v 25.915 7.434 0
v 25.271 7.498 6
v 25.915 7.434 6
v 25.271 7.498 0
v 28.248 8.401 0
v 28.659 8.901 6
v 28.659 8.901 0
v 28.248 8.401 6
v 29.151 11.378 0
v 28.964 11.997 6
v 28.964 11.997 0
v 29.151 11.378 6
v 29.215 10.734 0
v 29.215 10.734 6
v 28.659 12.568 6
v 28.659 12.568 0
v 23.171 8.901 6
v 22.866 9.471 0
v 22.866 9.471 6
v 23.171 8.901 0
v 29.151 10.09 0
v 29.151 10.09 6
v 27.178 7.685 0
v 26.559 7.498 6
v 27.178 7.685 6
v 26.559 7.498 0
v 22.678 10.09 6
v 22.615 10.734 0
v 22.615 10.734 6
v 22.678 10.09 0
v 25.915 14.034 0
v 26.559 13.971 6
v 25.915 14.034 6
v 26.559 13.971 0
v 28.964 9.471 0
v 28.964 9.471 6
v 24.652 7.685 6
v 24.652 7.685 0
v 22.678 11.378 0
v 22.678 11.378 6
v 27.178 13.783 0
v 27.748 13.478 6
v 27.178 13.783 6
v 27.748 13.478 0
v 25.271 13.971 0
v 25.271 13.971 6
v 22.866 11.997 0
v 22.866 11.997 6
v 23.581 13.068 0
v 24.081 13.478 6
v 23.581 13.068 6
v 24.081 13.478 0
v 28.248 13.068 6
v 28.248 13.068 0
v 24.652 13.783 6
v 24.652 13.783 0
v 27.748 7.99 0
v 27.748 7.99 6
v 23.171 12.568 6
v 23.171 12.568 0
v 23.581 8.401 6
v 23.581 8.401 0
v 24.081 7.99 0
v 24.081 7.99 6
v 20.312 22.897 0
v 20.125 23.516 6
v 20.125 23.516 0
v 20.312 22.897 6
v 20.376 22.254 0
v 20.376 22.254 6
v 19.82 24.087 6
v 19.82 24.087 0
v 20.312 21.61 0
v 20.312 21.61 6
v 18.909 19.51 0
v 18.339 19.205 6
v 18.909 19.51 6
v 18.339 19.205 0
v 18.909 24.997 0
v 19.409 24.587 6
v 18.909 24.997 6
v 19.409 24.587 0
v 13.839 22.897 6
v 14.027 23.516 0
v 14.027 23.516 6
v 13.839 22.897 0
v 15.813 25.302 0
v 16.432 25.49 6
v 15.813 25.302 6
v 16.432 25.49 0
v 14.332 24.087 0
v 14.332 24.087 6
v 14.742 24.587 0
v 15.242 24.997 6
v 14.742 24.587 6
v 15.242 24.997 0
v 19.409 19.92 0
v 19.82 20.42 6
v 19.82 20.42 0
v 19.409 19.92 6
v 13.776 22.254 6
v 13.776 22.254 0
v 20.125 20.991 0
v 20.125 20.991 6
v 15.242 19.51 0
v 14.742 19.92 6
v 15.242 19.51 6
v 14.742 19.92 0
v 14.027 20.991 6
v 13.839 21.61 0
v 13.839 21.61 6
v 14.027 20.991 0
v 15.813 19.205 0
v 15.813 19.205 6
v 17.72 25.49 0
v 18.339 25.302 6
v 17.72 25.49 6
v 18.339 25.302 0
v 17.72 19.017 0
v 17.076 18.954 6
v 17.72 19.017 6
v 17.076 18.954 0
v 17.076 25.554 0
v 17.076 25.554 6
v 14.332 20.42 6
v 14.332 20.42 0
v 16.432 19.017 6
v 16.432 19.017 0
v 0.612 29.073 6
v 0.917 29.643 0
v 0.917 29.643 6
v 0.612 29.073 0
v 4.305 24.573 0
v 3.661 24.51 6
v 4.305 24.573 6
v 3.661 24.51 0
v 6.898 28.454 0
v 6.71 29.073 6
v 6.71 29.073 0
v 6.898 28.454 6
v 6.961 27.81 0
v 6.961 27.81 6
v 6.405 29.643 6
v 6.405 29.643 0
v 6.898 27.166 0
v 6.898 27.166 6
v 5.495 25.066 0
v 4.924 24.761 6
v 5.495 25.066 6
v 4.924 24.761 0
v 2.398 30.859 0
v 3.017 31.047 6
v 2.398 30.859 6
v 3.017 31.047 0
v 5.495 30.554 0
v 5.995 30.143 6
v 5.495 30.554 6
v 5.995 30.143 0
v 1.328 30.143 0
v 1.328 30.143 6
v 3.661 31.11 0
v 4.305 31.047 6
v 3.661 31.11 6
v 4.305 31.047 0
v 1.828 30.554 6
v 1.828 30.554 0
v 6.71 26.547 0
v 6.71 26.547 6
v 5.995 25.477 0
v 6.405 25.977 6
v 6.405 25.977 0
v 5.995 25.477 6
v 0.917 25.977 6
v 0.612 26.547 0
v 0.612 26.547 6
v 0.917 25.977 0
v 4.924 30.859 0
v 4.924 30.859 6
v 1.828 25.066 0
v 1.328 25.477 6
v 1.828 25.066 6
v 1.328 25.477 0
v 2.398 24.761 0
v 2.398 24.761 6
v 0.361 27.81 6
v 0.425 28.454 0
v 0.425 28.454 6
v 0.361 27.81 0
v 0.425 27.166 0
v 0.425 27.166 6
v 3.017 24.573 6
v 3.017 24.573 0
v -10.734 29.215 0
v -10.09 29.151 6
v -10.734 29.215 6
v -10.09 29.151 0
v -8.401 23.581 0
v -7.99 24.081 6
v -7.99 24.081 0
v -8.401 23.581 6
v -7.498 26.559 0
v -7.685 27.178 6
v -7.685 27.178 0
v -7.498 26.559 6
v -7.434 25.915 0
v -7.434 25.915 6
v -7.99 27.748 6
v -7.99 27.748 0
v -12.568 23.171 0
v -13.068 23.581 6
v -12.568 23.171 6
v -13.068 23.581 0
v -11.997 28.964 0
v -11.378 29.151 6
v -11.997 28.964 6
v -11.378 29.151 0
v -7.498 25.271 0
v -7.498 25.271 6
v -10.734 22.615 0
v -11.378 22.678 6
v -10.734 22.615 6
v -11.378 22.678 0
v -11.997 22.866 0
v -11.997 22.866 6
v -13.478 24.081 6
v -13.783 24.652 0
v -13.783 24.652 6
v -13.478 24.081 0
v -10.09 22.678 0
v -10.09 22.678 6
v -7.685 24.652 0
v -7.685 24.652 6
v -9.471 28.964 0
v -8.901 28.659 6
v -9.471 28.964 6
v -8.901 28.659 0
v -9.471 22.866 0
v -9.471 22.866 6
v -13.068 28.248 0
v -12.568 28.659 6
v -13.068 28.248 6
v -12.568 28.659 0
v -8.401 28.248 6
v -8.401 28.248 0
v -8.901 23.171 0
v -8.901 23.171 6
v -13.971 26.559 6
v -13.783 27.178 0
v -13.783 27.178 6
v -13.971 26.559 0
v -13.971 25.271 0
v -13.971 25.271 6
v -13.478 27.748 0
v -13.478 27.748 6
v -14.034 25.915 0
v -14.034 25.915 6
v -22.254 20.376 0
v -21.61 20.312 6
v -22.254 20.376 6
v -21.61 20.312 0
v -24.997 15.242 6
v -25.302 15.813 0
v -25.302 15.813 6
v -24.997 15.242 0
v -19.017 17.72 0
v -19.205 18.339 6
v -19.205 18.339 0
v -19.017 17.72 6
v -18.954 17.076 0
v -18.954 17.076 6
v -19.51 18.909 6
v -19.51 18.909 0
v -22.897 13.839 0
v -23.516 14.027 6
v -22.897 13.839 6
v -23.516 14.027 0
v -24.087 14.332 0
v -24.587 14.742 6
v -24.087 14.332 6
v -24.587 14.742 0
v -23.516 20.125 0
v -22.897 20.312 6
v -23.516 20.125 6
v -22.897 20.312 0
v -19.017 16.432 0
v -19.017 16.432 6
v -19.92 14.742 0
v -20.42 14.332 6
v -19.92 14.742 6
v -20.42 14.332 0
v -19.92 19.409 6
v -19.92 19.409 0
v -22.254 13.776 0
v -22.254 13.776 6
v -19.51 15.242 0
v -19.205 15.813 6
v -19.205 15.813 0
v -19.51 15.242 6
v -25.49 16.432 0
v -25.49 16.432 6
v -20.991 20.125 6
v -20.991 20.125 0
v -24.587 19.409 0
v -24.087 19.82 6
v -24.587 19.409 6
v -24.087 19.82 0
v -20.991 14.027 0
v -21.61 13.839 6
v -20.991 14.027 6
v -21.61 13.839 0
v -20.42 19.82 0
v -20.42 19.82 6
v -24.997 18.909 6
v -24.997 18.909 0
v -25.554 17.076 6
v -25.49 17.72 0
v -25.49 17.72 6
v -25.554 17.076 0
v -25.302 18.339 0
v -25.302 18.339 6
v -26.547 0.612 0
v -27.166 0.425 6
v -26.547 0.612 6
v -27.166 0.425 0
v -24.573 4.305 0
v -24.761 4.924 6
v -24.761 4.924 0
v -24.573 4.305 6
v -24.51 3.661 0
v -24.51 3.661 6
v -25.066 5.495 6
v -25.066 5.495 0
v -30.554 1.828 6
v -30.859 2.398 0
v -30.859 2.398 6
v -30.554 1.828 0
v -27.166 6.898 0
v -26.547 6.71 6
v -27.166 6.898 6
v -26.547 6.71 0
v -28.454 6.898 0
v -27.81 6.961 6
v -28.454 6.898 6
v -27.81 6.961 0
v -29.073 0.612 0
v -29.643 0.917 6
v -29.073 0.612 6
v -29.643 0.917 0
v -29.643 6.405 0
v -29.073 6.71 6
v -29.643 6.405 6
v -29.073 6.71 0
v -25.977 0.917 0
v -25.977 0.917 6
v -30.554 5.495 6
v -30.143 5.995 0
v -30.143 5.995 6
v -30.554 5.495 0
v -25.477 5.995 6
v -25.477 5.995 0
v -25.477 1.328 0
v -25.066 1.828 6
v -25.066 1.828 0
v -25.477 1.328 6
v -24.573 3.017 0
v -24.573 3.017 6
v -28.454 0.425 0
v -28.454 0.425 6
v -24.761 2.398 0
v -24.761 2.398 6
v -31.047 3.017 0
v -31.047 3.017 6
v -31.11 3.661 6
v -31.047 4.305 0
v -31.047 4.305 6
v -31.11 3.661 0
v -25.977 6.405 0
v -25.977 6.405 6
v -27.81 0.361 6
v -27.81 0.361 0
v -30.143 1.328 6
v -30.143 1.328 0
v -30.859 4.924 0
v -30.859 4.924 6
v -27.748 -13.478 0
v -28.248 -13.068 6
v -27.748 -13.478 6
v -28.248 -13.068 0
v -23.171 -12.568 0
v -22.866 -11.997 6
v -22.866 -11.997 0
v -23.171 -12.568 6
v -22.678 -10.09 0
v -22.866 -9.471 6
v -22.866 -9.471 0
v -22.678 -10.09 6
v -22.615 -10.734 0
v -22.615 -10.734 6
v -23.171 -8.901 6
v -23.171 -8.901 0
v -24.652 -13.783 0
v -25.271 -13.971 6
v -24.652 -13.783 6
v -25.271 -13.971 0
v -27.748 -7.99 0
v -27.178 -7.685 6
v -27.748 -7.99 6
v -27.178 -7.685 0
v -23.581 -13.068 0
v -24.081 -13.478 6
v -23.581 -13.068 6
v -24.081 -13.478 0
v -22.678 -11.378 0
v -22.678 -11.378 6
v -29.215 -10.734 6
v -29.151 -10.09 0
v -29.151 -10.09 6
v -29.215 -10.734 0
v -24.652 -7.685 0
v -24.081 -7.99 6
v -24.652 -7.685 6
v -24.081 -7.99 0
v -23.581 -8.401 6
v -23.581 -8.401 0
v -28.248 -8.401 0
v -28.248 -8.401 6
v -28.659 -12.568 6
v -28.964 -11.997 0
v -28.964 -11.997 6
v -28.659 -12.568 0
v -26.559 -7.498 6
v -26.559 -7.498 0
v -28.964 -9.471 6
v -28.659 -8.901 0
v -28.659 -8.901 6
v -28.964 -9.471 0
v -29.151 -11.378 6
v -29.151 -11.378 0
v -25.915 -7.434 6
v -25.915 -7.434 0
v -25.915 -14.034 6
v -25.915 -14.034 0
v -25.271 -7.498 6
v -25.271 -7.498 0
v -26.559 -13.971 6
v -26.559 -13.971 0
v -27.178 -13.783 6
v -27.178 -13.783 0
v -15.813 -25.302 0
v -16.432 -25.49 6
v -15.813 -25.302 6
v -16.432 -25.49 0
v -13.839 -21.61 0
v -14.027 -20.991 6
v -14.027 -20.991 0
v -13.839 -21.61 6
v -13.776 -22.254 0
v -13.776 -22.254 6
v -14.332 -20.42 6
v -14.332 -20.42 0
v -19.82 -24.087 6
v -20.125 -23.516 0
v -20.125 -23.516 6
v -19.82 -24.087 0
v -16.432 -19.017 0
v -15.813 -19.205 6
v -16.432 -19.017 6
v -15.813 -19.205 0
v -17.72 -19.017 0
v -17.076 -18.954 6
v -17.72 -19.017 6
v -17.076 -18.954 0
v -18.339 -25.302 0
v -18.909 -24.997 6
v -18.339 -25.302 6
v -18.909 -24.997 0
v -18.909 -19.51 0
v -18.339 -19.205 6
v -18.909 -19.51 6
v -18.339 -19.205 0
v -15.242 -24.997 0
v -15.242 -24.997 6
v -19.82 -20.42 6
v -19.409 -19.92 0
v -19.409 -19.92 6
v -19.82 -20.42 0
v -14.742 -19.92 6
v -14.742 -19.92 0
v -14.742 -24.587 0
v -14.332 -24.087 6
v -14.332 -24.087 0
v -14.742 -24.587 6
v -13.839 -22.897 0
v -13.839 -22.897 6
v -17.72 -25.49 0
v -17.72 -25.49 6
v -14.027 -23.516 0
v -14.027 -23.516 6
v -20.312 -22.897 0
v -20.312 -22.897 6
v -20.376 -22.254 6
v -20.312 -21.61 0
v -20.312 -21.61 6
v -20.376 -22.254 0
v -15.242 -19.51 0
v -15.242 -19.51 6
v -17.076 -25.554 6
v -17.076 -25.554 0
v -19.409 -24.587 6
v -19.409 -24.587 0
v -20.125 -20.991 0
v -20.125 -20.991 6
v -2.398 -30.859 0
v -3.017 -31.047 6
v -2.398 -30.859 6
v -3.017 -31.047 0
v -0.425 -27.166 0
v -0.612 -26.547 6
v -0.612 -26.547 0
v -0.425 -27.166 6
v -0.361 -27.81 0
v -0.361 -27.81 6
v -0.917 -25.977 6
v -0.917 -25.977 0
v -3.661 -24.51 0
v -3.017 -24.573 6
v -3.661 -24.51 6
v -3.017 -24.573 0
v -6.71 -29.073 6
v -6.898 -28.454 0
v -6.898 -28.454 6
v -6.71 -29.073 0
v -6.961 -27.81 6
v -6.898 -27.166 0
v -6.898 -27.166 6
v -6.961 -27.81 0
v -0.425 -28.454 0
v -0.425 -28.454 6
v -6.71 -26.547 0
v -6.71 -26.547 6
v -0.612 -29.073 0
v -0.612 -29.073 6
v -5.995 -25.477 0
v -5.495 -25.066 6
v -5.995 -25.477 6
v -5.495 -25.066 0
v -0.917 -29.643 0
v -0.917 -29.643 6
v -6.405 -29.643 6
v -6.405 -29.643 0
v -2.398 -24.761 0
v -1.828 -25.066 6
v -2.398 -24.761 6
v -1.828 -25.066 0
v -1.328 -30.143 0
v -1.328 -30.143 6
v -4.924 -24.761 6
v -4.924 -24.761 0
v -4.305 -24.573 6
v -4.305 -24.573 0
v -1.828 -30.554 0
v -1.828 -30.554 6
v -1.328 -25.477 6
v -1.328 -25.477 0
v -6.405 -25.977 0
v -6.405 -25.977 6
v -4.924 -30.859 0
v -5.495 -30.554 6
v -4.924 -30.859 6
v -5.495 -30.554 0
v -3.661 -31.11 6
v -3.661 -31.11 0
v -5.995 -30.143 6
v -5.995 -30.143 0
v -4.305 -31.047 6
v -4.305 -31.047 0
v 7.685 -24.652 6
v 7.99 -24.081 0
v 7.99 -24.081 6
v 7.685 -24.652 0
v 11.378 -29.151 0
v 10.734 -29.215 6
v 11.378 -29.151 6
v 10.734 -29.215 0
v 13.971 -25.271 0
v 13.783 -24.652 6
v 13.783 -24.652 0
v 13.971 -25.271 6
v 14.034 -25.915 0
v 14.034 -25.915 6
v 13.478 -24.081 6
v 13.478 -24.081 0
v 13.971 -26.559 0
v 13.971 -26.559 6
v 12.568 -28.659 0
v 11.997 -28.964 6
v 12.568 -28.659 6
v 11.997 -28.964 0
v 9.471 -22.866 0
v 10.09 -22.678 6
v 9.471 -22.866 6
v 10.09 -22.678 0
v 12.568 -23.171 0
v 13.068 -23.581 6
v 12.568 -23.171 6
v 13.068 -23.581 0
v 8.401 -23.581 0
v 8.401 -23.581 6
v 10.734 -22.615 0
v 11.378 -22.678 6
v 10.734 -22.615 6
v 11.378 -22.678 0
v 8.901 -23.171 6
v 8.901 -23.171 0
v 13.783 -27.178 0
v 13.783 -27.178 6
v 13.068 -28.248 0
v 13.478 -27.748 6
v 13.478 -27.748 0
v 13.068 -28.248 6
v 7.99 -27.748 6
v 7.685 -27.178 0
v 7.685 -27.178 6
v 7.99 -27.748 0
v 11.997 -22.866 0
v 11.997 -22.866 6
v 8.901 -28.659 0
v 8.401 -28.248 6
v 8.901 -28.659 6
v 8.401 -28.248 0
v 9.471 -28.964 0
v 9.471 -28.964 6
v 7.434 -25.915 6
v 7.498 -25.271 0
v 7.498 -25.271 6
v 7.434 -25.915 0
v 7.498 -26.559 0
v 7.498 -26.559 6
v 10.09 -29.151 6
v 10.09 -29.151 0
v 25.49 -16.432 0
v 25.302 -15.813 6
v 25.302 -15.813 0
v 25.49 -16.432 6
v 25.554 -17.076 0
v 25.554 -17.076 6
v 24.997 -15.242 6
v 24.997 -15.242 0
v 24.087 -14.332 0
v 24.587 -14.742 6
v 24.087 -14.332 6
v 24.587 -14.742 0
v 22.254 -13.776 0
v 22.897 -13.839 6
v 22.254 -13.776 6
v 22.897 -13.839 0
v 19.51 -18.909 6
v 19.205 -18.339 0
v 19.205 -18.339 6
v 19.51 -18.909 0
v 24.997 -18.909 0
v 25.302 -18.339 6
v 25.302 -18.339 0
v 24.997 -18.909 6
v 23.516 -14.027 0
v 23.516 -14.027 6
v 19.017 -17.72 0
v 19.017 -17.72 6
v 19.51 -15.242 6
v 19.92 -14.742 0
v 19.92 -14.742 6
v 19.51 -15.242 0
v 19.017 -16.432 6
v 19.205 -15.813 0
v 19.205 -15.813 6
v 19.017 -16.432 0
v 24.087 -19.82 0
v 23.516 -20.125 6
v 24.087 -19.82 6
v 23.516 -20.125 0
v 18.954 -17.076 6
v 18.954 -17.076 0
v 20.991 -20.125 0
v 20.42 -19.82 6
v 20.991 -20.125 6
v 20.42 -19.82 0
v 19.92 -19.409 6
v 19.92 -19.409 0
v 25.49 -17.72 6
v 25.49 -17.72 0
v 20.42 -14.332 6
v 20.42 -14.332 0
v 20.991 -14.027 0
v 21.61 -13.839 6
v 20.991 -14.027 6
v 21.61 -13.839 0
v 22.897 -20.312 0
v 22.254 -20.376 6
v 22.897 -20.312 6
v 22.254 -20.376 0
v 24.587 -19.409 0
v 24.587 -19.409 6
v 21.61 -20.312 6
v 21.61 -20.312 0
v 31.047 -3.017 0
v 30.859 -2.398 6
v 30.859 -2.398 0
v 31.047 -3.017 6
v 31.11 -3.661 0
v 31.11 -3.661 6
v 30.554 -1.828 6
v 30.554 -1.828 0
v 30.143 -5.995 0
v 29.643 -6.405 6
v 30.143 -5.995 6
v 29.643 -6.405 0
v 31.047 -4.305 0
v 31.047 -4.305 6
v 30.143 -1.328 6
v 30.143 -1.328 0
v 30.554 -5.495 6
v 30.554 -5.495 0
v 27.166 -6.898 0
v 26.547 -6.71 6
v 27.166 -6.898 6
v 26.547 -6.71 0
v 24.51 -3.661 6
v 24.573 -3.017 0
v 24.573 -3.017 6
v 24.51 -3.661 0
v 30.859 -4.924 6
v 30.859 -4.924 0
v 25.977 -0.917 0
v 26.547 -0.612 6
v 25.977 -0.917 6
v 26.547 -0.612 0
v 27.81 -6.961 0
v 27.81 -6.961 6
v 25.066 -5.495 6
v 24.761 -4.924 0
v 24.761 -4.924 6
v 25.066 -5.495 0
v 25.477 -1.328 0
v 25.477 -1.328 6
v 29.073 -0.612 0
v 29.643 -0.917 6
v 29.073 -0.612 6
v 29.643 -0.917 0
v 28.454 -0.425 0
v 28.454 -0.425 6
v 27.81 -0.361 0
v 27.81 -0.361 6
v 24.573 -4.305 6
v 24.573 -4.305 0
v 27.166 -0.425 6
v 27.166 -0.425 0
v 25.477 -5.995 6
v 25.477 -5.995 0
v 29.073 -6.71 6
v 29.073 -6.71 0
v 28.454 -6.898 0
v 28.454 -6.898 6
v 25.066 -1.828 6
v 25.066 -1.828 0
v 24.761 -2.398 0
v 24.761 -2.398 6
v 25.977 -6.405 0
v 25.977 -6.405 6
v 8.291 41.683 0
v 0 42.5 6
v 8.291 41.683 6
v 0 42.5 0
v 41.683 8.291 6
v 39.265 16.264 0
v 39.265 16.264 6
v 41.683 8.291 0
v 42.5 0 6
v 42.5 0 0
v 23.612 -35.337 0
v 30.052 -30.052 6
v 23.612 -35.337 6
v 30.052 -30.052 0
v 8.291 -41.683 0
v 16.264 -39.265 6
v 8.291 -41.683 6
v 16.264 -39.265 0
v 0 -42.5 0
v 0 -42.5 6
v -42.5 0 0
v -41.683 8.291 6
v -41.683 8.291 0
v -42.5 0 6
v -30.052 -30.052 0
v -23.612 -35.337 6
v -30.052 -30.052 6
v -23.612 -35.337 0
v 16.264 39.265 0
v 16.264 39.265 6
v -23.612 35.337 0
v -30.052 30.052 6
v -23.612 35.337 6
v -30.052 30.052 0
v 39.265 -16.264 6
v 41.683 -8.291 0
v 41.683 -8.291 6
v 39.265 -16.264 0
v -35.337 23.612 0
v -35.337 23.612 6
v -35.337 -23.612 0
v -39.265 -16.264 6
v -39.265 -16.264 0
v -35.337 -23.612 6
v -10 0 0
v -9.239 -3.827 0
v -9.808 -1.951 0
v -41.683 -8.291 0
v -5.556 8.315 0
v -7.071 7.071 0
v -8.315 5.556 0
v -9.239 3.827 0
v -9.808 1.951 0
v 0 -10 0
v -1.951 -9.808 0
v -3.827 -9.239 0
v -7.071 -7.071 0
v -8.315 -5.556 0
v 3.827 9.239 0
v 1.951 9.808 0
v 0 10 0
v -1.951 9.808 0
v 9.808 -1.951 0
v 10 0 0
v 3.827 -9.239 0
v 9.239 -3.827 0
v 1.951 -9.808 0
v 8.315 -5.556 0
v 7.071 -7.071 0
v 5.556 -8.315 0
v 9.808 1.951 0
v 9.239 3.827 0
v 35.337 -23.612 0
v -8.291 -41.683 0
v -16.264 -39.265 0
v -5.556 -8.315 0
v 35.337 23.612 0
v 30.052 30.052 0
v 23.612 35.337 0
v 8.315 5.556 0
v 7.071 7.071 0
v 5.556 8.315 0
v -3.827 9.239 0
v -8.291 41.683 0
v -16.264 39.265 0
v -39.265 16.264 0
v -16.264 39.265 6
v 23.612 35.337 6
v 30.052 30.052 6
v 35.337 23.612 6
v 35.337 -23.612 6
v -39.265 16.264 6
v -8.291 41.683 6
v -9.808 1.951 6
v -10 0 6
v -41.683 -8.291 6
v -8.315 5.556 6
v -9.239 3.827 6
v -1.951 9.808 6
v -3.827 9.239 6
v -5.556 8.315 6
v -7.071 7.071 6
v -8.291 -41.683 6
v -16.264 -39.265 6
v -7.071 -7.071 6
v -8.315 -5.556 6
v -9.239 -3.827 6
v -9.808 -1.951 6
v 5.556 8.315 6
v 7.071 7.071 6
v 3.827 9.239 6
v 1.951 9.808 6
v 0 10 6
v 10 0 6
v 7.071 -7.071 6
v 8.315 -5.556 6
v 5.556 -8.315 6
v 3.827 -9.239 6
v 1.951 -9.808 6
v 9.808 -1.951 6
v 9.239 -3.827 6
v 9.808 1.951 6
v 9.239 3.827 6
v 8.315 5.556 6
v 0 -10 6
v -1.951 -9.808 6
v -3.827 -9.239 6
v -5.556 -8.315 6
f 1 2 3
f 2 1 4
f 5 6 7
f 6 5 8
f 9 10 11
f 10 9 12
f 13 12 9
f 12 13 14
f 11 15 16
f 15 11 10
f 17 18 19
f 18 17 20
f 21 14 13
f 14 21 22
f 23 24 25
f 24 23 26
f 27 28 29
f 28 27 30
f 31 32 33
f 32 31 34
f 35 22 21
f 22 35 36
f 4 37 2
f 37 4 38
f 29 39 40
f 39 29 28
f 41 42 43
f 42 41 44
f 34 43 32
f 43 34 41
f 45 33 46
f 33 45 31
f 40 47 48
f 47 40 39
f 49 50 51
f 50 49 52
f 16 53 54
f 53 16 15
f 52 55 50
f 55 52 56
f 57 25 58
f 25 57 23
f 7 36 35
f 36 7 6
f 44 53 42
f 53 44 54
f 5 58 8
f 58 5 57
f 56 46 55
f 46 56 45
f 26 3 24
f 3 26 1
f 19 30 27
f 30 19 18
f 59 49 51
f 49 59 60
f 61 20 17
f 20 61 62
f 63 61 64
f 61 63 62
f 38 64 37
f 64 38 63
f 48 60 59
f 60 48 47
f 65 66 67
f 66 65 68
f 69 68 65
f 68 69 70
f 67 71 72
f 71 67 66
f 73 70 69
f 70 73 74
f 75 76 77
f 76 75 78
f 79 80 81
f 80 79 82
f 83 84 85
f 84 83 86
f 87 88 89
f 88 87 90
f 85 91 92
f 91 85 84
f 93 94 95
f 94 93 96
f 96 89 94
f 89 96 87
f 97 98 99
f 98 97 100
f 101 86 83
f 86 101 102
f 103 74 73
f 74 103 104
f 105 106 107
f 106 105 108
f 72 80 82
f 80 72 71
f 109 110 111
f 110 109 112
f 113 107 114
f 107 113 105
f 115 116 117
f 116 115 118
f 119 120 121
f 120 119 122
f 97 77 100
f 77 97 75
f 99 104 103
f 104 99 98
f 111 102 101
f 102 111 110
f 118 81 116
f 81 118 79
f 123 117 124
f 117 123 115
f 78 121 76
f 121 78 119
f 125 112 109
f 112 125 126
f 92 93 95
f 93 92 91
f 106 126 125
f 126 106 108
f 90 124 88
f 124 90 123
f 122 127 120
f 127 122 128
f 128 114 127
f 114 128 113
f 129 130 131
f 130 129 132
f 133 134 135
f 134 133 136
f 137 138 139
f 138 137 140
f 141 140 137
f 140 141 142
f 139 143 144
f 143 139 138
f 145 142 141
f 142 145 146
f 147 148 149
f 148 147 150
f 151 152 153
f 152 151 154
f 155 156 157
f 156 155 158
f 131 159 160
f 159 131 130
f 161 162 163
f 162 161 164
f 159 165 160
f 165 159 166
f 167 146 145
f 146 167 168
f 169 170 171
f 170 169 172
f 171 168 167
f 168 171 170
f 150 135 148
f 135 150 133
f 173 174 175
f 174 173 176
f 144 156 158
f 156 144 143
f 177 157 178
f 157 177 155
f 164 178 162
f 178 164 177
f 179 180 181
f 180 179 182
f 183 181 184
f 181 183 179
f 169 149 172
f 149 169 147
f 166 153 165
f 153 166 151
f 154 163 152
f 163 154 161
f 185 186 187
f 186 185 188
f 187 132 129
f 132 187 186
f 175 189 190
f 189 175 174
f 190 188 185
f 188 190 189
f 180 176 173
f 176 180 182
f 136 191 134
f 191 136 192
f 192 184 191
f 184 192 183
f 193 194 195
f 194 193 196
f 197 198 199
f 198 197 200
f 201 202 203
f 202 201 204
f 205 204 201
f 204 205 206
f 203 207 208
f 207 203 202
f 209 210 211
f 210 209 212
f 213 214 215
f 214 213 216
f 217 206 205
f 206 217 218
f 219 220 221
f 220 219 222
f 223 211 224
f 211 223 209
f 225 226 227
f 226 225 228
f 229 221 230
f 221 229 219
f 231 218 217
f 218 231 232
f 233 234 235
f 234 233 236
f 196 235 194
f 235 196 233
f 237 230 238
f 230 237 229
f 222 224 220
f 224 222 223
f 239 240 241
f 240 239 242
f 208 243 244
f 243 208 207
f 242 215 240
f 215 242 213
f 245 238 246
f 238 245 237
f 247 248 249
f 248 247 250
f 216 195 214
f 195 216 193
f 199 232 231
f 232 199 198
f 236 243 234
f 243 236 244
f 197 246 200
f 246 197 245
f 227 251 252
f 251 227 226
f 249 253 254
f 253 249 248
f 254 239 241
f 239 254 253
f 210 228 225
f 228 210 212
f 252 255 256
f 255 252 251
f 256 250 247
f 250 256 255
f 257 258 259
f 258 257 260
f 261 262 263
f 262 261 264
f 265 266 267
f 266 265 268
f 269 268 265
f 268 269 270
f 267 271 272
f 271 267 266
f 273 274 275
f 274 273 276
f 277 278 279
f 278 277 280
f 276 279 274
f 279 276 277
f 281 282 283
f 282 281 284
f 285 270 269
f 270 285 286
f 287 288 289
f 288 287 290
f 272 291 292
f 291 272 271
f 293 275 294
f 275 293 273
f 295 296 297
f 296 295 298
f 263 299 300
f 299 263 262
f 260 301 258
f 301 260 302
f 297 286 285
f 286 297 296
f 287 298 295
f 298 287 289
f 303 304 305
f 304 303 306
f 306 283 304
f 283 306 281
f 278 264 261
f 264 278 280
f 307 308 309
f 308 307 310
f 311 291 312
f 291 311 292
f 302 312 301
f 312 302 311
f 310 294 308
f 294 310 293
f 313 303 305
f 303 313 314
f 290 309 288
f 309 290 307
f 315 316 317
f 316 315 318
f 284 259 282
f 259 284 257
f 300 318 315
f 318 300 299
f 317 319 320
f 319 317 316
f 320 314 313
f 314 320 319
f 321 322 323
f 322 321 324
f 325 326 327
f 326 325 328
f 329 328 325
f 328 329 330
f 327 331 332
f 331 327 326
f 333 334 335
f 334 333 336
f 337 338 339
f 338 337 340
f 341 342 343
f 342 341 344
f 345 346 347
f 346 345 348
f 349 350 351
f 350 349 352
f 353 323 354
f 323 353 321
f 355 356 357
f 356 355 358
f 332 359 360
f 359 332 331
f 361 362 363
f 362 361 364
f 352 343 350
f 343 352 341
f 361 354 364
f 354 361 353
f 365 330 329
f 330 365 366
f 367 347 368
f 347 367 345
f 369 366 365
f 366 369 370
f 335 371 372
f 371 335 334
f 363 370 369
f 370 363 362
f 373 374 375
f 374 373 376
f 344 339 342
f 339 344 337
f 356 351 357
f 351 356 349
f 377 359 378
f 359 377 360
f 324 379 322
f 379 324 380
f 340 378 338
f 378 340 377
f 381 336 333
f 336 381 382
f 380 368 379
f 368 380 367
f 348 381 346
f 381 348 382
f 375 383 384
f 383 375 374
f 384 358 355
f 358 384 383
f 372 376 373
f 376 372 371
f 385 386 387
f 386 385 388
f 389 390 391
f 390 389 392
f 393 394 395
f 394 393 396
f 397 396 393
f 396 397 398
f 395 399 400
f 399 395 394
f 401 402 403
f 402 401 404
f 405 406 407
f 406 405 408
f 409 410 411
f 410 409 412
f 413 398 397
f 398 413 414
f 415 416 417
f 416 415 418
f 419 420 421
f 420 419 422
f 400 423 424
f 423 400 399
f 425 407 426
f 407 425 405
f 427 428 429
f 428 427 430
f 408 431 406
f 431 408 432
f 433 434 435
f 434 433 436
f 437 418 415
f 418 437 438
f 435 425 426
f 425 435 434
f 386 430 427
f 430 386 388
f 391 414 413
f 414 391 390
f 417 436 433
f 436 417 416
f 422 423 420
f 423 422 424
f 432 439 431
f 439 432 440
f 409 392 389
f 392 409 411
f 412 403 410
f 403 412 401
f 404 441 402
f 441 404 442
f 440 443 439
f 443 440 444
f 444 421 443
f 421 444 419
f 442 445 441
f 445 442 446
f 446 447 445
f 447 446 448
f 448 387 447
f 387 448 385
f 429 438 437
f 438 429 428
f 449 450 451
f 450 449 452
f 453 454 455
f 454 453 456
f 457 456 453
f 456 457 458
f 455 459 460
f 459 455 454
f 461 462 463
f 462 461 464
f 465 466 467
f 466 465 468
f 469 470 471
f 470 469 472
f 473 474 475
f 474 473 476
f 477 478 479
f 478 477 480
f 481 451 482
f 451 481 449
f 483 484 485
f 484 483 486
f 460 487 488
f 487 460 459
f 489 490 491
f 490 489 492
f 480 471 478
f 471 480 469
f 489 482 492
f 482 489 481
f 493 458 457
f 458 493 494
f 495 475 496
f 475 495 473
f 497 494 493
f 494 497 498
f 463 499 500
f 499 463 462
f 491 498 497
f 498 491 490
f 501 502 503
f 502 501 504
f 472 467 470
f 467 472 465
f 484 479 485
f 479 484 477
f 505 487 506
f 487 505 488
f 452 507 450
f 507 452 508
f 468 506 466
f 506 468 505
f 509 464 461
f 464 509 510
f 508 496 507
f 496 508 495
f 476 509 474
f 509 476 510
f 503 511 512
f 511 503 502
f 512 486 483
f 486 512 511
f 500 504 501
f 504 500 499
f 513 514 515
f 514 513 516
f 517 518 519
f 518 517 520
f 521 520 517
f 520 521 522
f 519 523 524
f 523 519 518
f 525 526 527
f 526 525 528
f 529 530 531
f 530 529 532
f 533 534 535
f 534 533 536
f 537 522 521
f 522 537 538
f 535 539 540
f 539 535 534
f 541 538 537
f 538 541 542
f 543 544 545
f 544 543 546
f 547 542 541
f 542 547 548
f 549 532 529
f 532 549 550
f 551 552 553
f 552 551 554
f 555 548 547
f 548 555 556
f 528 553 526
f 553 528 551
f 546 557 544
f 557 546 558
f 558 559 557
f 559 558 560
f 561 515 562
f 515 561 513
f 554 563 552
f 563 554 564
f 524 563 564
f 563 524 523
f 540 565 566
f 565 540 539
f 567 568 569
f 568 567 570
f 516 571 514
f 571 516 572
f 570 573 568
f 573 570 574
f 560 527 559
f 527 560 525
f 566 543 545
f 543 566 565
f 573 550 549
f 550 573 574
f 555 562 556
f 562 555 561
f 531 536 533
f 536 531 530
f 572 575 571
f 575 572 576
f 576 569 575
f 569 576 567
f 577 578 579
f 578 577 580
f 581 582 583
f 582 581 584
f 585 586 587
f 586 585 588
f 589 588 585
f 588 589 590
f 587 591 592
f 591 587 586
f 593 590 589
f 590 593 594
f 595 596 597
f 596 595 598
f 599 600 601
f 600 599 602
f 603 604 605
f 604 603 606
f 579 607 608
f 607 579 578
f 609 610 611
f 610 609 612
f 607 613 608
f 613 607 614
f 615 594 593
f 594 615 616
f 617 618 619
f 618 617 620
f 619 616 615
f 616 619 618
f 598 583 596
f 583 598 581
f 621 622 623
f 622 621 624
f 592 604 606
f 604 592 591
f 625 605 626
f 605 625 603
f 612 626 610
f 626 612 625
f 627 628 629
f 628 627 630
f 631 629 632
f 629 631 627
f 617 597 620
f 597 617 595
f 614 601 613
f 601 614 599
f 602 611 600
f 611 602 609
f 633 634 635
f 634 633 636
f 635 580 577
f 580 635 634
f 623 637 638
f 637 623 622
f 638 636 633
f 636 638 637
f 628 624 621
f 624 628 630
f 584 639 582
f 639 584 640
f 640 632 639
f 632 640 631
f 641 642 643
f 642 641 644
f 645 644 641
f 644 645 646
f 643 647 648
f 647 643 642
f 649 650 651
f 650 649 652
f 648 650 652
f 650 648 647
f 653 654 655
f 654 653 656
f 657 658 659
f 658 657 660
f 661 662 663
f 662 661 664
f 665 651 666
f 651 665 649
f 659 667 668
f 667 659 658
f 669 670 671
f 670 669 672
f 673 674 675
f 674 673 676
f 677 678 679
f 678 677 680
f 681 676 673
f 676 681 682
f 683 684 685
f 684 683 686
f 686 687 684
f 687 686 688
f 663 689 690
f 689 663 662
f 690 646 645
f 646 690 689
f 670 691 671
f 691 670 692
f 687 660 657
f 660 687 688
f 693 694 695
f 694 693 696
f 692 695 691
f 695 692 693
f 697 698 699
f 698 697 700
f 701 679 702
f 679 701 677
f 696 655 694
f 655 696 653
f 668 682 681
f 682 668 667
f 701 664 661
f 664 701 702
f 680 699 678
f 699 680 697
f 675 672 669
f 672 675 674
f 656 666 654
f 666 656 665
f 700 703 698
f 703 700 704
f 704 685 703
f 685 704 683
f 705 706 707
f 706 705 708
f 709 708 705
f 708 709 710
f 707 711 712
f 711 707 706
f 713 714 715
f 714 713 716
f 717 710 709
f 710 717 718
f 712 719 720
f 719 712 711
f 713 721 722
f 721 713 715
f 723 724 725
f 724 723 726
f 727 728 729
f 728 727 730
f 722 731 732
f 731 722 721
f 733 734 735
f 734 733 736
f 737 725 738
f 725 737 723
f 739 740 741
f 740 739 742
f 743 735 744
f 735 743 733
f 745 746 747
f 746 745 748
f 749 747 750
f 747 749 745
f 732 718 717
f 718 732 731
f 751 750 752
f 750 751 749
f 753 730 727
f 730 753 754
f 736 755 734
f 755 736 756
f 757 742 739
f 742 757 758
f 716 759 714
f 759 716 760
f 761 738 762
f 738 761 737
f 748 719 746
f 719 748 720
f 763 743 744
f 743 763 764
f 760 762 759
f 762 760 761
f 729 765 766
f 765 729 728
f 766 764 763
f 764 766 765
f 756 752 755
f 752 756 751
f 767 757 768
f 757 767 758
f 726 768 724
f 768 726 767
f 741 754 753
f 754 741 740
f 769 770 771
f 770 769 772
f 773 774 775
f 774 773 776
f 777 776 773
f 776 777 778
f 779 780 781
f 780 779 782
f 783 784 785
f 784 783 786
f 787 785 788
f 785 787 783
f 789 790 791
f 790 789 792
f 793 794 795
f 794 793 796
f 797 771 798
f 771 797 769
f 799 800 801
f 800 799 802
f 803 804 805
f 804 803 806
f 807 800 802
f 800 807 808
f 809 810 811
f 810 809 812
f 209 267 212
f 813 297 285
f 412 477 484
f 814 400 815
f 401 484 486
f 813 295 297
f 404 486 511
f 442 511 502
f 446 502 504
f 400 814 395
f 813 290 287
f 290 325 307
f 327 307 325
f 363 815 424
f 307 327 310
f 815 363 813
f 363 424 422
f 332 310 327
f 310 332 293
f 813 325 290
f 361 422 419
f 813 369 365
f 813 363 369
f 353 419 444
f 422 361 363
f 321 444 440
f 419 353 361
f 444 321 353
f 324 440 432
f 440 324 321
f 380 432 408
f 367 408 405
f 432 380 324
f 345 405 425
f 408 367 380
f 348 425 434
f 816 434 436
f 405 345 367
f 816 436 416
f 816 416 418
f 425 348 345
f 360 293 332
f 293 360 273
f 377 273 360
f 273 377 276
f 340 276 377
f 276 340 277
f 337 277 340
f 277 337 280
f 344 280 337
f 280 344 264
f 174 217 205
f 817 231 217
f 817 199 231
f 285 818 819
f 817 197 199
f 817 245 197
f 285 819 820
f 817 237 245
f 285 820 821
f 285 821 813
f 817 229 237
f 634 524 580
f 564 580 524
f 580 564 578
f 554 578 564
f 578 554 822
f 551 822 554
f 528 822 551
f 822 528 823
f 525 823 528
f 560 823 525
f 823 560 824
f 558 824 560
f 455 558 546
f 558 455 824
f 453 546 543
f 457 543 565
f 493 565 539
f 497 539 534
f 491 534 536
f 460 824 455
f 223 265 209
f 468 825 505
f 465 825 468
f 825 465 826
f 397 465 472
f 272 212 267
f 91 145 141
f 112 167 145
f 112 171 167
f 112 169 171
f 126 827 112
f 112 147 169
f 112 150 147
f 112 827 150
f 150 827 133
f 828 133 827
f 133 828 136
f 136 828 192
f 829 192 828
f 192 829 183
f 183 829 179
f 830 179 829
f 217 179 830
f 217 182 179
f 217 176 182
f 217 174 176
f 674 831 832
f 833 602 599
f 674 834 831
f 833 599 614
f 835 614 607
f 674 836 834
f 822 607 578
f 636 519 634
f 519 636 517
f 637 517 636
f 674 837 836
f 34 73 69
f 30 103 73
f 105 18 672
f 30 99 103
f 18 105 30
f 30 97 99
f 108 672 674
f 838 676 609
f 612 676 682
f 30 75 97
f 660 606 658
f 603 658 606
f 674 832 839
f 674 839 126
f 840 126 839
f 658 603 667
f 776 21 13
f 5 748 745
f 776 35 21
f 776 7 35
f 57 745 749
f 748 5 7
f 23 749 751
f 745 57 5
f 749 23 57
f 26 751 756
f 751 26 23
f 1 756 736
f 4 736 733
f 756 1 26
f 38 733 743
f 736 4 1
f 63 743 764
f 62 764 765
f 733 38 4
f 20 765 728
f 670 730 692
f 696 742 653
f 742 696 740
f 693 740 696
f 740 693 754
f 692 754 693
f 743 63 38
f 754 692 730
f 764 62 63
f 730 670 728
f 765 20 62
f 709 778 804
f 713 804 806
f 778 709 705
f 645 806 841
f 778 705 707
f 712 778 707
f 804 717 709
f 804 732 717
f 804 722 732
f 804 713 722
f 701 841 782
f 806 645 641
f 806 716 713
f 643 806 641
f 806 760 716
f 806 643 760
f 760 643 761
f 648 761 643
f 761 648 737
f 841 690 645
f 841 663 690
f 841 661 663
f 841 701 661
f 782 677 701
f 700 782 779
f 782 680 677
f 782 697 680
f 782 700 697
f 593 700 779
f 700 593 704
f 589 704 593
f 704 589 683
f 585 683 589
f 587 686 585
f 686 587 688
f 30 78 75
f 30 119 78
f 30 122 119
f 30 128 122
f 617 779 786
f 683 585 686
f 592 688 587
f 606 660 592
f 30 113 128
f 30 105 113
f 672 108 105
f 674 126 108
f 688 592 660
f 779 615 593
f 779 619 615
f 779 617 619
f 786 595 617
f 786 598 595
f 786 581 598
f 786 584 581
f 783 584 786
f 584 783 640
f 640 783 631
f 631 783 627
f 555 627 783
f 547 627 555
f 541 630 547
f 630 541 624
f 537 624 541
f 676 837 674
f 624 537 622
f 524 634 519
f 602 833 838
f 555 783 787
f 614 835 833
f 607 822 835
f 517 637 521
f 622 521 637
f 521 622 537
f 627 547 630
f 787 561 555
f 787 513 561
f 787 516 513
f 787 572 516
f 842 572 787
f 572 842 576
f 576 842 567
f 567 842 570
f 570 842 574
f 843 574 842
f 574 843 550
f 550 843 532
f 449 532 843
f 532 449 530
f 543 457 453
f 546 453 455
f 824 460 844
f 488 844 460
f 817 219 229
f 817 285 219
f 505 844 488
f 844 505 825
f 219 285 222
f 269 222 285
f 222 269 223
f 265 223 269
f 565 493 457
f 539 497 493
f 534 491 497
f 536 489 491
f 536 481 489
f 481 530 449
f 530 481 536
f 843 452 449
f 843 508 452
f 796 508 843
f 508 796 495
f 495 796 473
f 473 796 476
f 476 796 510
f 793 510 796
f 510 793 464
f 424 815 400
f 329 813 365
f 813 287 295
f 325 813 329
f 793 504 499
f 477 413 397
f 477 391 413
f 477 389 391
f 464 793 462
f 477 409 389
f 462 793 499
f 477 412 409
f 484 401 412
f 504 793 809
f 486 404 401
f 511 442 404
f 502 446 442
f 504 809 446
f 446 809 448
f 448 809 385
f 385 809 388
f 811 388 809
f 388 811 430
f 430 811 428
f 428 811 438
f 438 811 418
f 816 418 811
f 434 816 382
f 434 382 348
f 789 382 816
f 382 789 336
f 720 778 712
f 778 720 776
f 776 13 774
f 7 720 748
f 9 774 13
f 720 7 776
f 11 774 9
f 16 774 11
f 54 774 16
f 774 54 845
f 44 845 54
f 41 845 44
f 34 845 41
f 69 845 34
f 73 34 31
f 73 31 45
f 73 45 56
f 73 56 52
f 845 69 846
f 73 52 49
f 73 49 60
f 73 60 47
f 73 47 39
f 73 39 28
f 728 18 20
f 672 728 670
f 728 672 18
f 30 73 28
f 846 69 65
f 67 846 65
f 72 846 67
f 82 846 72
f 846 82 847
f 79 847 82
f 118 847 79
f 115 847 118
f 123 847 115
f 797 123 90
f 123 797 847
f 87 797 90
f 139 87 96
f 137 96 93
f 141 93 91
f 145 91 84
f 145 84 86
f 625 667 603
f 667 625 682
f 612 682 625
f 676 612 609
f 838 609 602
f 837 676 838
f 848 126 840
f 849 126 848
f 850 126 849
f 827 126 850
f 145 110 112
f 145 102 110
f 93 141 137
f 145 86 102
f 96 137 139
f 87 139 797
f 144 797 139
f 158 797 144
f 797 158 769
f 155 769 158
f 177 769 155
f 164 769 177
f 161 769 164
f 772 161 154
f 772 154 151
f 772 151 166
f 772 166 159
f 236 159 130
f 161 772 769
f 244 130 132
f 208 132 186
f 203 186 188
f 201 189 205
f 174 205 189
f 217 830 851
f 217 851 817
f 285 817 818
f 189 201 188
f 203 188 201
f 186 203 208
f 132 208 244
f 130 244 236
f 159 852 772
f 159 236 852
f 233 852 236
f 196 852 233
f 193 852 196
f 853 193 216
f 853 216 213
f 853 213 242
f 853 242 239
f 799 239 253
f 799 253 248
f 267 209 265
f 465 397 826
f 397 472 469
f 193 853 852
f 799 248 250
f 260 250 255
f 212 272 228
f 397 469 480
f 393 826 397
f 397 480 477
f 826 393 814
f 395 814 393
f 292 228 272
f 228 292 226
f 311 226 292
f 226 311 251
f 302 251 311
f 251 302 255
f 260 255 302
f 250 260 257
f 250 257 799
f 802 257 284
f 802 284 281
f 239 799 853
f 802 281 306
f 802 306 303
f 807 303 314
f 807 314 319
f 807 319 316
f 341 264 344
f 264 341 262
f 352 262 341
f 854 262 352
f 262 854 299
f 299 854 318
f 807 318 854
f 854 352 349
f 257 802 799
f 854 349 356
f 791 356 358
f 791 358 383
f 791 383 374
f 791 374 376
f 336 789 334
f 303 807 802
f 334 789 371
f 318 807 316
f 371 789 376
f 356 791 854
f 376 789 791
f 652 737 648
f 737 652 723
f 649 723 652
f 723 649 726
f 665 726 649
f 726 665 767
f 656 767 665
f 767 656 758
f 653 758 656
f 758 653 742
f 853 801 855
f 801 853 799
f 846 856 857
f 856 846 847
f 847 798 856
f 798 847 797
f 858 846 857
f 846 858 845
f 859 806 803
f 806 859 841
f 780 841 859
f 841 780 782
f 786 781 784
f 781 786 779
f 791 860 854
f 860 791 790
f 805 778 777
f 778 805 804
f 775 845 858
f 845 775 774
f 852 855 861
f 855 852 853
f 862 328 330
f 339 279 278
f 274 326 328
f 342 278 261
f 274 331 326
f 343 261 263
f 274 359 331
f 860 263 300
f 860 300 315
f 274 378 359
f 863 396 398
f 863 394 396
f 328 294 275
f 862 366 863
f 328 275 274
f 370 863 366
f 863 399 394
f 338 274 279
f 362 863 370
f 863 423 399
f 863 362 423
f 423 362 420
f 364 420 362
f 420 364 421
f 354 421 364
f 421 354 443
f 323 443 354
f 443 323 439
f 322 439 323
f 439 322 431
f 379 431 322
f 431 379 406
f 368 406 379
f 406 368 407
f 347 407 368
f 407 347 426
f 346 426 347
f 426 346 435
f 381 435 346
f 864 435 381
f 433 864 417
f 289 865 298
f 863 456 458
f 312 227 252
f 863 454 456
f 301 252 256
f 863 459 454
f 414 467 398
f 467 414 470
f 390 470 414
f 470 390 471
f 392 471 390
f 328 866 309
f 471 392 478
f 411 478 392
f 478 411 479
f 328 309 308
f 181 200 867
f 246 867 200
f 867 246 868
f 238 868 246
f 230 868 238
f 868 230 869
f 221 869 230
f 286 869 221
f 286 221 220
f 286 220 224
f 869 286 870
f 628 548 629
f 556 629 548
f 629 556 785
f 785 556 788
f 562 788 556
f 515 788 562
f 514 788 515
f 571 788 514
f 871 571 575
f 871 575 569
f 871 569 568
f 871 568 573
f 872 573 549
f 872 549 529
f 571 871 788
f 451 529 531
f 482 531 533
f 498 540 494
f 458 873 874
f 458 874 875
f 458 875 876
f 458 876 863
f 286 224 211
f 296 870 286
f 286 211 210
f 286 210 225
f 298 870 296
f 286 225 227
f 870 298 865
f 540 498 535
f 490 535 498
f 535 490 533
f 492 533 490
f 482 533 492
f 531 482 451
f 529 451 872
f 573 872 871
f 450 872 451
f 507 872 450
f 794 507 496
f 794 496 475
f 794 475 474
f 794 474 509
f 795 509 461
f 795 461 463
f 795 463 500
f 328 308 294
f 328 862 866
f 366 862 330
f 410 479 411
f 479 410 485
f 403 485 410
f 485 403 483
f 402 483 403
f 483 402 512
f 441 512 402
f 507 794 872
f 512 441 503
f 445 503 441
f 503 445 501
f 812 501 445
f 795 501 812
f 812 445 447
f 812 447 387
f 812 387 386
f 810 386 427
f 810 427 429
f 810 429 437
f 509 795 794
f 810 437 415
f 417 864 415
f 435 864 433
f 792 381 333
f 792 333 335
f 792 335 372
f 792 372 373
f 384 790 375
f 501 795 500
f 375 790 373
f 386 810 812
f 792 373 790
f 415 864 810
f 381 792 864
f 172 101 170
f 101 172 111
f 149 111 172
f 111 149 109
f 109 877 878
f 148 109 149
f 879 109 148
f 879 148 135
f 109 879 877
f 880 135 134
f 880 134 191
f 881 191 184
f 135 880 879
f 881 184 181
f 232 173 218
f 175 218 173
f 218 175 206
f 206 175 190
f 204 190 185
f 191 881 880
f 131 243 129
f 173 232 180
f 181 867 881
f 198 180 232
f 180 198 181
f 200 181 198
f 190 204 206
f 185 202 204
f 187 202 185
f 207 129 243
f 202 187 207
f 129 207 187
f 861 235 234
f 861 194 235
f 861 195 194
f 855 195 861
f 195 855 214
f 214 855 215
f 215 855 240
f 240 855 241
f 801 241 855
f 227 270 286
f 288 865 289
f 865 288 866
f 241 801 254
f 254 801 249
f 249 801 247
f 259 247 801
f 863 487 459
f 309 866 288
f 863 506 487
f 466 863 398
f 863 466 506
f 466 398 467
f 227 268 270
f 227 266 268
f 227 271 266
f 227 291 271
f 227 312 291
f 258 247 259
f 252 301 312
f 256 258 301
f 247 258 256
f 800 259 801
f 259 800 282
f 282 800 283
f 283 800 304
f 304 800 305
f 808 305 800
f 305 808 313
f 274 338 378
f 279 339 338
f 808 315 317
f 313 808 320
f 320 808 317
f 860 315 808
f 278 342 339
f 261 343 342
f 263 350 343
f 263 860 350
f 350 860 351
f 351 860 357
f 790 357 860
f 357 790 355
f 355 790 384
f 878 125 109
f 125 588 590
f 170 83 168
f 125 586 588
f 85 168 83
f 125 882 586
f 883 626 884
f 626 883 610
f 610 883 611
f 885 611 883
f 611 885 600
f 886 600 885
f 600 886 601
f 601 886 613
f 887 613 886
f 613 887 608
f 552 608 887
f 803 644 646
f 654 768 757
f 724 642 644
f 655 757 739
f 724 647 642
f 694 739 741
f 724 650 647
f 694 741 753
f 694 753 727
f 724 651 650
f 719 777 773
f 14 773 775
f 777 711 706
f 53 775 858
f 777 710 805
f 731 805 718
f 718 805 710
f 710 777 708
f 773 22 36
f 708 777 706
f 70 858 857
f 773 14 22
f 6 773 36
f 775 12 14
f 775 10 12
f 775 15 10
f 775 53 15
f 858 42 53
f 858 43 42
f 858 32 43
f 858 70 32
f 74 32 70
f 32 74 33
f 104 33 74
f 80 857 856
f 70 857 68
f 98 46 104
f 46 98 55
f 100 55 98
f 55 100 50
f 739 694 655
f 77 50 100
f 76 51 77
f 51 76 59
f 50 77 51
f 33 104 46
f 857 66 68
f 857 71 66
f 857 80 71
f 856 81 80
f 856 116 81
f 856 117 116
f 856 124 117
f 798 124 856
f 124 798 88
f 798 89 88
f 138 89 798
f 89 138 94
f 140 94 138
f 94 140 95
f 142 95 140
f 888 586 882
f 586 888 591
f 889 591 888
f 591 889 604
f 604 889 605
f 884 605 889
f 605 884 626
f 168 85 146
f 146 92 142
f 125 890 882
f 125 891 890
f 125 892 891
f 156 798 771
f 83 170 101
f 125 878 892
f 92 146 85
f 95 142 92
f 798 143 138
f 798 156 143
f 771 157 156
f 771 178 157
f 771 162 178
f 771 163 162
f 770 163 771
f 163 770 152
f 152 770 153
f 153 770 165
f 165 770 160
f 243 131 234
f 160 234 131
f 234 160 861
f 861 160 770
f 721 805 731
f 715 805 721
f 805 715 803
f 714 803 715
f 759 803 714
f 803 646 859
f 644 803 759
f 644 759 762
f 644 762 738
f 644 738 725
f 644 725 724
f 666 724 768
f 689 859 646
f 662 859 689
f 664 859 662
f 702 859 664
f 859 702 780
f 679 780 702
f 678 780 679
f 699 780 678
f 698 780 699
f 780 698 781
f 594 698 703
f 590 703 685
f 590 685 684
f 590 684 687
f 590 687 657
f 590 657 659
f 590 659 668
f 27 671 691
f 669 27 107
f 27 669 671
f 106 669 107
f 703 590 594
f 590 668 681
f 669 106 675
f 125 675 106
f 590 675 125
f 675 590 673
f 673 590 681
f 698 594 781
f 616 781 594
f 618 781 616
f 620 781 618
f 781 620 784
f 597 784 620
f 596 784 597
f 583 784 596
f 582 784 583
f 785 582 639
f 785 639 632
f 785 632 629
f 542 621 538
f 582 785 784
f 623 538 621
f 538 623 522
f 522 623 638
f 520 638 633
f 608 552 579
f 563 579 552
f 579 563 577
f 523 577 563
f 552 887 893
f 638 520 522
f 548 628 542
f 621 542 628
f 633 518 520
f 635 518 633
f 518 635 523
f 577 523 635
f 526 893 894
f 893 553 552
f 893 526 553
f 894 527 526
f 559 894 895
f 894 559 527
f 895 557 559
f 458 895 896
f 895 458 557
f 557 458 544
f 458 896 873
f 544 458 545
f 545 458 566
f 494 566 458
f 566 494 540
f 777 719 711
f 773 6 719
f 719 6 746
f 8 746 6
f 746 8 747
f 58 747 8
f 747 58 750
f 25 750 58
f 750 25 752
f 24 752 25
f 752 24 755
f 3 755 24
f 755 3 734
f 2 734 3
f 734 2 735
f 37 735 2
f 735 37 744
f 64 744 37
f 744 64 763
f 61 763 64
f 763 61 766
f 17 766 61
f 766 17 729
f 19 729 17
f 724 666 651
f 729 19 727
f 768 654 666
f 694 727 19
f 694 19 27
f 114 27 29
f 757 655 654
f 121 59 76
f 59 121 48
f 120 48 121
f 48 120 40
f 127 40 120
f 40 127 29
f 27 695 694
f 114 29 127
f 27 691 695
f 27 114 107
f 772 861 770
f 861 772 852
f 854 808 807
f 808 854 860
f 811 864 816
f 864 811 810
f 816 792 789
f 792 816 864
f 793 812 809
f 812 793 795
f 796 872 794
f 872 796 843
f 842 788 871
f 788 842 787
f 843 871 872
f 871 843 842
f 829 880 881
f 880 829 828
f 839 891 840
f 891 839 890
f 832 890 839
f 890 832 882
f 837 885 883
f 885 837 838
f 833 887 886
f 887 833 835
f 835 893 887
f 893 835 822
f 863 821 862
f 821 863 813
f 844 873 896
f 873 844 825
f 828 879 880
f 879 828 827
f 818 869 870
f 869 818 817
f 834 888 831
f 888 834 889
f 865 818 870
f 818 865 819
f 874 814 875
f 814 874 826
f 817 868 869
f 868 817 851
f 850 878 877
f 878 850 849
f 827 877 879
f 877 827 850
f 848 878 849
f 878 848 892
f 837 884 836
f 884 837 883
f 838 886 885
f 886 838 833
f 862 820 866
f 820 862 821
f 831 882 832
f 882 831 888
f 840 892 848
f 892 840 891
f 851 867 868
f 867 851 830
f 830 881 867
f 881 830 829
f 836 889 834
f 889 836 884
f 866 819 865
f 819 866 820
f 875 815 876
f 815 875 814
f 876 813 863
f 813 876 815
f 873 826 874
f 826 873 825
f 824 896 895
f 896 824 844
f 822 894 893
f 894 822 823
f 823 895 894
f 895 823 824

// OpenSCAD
$fn = 32;

// ----------------------------------------------------------------------
// Flange Ø85 x 6
// 12 holes on a Ø56.1 bolt circle, bolted joints
// ----------------------------------------------------------------------

// --- parameters (mm) ---
flange_d = 85;     // outside diameter of the flange
thickness = 6;     // flange thickness
holes = 12;        // number of bolt holes
pcd = 56.1;        // bolt circle diameter
start_deg = 22.5;  // angle of the first hole, from +X
hole_d = 6.6;      // bolt hole diameter
bore_d = 20;       // central through bore
hub_d = 32;        // hub outside diameter
hub_h = 0;         // hub height above the flange face (0 = no hub)

// --- derived feature positions (mm) ---
height = thickness + hub_h;  // = 6   overall height of the part
pcd_r = pcd / 2;             // = 28.05   bolt circle radius
hole_step = 360 / holes;     // = 30   angular pitch
feature_centers = [
  [pcd_r * cos(start_deg + 0 * hole_step), pcd_r * sin(start_deg + 0 * hole_step)],
  [pcd_r * cos(start_deg + 1 * hole_step), pcd_r * sin(start_deg + 1 * hole_step)],
  [pcd_r * cos(start_deg + 2 * hole_step), pcd_r * sin(start_deg + 2 * hole_step)],
  [pcd_r * cos(start_deg + 3 * hole_step), pcd_r * sin(start_deg + 3 * hole_step)],
  [pcd_r * cos(start_deg + 4 * hole_step), pcd_r * sin(start_deg + 4 * hole_step)],
  [pcd_r * cos(start_deg + 5 * hole_step), pcd_r * sin(start_deg + 5 * hole_step)],
  [pcd_r * cos(start_deg + 6 * hole_step), pcd_r * sin(start_deg + 6 * hole_step)],
  [pcd_r * cos(start_deg + 7 * hole_step), pcd_r * sin(start_deg + 7 * hole_step)],
  [pcd_r * cos(start_deg + 8 * hole_step), pcd_r * sin(start_deg + 8 * hole_step)],
  [pcd_r * cos(start_deg + 9 * hole_step), pcd_r * sin(start_deg + 9 * hole_step)],
  [pcd_r * cos(start_deg + 10 * hole_step), pcd_r * sin(start_deg + 10 * hole_step)],
  [pcd_r * cos(start_deg + 11 * hole_step), pcd_r * sin(start_deg + 11 * hole_step)]
];   // bolt hole centres on the pitch circle

// flange disc, every hole and the bore cut straight through
difference() {
  union() {
    cylinder(d = flange_d, h = thickness);
  }
  translate([0, 0, -1]) cylinder(d = bore_d, h = height + 2);  // bore, through
  for (centre = feature_centers)
    translate([centre[0], centre[1], -1]) cylinder(d = hole_d, h = thickness + 2);
}
